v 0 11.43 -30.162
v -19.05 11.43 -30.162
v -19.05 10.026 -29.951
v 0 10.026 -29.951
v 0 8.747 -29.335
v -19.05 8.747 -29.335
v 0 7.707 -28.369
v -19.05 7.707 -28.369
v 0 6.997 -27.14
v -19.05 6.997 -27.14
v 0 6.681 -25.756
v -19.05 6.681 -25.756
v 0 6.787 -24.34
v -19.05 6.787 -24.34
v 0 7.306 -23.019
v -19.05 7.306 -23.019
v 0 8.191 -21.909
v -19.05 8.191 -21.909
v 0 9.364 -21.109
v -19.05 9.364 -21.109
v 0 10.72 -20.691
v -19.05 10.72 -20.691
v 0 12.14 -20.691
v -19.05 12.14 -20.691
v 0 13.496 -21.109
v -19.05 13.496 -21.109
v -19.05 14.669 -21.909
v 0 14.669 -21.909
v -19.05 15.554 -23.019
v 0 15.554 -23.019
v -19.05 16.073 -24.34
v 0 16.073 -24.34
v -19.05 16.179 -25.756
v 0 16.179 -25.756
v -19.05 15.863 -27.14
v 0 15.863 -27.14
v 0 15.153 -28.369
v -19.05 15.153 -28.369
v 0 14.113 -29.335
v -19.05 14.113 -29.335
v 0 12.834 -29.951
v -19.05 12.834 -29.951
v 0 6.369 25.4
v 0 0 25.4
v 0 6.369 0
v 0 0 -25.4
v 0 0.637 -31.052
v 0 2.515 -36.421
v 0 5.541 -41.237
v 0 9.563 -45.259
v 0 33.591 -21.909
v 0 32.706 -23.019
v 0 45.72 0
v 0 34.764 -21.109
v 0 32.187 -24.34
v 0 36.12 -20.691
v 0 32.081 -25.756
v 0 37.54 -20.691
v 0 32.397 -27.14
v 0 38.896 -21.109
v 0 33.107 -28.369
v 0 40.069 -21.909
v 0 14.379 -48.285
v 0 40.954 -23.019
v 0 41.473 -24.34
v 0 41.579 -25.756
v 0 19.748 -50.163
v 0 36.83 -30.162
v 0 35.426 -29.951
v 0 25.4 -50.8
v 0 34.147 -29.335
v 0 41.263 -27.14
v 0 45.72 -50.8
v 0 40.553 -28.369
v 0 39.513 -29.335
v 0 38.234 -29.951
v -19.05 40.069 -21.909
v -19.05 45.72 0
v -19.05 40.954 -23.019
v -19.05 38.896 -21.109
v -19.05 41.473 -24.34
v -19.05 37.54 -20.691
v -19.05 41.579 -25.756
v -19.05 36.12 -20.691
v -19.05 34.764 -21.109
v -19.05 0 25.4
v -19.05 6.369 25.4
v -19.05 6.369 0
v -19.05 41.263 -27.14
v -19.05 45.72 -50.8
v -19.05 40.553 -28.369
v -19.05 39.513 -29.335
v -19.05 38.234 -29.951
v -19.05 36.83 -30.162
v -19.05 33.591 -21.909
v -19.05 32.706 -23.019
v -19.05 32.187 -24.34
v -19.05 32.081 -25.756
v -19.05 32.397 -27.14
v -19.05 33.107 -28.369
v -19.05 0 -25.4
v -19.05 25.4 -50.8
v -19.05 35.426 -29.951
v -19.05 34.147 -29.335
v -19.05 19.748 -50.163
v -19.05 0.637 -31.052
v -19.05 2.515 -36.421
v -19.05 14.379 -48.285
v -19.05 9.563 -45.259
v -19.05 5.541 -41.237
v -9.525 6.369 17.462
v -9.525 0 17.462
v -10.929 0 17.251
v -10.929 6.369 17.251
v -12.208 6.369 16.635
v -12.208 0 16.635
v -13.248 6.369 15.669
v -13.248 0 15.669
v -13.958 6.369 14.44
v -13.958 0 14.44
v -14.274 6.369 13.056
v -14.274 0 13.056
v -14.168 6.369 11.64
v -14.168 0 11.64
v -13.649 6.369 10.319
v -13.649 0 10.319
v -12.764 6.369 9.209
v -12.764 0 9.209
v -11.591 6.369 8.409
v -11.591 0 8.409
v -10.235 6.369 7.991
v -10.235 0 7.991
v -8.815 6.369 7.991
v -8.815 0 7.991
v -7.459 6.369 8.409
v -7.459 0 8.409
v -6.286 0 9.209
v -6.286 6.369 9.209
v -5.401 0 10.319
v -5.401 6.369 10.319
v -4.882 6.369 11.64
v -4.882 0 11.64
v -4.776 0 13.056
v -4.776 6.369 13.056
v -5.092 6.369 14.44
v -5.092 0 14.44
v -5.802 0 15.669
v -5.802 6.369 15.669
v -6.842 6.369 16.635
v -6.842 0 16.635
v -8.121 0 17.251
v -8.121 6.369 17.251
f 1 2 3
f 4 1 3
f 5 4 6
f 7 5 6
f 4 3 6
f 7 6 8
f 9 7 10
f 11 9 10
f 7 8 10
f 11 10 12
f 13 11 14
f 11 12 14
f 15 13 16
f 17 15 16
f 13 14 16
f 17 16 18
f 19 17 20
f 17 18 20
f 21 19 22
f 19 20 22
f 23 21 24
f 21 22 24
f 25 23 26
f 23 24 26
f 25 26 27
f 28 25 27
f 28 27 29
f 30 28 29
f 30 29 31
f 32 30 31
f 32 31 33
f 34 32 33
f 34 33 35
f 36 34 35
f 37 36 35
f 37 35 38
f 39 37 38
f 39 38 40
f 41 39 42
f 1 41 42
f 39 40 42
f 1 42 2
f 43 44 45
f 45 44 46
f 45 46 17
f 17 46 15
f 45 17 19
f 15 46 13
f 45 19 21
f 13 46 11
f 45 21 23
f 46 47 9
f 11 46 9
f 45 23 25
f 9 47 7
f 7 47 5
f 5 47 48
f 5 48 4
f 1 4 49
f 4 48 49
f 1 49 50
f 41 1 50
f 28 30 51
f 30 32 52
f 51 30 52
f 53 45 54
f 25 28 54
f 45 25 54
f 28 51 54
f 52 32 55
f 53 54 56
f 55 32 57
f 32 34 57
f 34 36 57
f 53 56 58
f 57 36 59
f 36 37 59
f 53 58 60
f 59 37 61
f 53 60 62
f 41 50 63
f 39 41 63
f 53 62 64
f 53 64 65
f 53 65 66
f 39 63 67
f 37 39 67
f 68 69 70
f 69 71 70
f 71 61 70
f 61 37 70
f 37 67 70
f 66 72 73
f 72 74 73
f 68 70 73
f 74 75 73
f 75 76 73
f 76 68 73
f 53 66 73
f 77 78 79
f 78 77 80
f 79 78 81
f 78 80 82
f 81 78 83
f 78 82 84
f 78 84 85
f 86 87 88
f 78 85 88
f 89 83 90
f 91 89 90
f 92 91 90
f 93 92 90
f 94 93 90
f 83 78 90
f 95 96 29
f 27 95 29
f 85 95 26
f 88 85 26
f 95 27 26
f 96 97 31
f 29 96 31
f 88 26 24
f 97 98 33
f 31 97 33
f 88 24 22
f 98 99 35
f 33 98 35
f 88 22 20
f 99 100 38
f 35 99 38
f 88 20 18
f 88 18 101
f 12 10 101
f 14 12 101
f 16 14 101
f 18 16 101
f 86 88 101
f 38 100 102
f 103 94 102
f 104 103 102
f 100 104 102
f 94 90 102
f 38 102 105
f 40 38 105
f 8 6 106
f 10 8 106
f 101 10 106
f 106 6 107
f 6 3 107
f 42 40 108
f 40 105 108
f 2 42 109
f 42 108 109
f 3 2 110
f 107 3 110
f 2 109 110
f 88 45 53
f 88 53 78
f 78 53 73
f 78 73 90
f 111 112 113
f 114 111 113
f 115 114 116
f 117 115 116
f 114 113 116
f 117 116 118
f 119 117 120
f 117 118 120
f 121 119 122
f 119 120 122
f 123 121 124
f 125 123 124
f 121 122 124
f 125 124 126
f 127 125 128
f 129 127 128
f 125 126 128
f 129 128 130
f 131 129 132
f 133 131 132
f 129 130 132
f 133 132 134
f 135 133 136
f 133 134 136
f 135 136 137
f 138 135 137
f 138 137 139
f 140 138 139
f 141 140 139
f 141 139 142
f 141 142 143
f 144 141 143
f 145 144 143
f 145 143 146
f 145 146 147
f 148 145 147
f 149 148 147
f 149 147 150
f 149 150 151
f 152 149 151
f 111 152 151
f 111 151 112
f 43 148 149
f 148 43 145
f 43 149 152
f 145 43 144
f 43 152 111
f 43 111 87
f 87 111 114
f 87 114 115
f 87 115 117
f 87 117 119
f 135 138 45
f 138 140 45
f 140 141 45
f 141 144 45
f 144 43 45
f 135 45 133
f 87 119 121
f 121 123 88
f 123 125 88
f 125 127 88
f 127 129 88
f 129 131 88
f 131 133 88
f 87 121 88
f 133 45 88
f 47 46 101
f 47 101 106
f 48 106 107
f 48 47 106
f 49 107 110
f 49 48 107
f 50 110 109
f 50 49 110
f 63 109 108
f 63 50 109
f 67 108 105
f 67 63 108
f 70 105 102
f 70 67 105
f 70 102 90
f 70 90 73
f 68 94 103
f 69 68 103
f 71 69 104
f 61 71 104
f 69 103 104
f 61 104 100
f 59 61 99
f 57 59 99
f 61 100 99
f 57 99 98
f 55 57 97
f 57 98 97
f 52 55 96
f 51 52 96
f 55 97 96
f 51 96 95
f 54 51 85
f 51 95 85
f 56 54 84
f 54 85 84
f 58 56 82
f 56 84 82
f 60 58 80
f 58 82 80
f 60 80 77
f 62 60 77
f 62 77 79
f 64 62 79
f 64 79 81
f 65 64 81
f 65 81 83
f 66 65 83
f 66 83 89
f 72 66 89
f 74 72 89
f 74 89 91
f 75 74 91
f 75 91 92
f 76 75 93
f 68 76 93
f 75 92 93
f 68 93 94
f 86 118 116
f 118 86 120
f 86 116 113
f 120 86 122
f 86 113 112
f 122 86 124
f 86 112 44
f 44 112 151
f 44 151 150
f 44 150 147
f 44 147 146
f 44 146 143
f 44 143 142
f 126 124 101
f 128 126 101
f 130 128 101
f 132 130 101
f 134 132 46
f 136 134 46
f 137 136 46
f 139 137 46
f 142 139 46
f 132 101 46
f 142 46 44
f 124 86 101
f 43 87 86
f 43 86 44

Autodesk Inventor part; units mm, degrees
ref_plane "YZ Plane" through (0, 0, 0) normal (1, 0, 0) x (0, 1, 0)
ref_plane "XZ Plane" through (0, 0, 0) normal (0, 1, 0) x (-1, 0, 0)
ref_plane "XY Plane" through (0, 0, 0) normal (0, 0, 1) x (1, 0, 0)
sketch "Sketch1" plane through (0, 0, 0) normal (0, 1, 0) x (-1, 0, 0)
  line L0 (0, 0) -> (19.05, 0)
  line L1 (19.05, 0) -> (19.05, -50.8)
  line L2 (19.05, -50.8) -> (0, -50.8)
  line L3 (0, -50.8) -> (0, 0)
  dimension "d0" = 19.05
  dimension "d1" = 50.8
extrude "Extrusion1" add sketch "Sketch1" along normal blind 45.72
fillet "Fillet1" radius 25.4 1 edges at (-9.525, 0, -50.8)
sketch "Sketch2" plane through (0, 0, 0) normal (1, 0, 0) x (0, 0, -1)
  point P0 (0, 0)
sketch "Sketch4" plane through (-19.05, 0, 0) normal (0, 0, 1) x (1, 0, 0)
  line L0 (0, 0) -> (19.05, 0)
  line L1 (19.05, 0) -> (19.05, 6.3692)
  line L2 (19.05, 6.3692) -> (0, 6.3692)
  line L3 (0, 6.3692) -> (0, 0)
extrude "Extrusion3" add sketch "Sketch4" along normal blind 25.4
hole "Hole2" at (-9.525, 6.3692, 12.7) direction (0, -1, 0) diameter 9.525 end through all
hole "Hole3" at (0, 36.83, -25.4) direction (-1, 0, 0) diameter 9.525 end through all
pattern_linear "Rectangular Pattern1" count 2 spacing 25.4 along (0, -1, 0) of "Hole3"
properties part number "boxbeam gusset"
